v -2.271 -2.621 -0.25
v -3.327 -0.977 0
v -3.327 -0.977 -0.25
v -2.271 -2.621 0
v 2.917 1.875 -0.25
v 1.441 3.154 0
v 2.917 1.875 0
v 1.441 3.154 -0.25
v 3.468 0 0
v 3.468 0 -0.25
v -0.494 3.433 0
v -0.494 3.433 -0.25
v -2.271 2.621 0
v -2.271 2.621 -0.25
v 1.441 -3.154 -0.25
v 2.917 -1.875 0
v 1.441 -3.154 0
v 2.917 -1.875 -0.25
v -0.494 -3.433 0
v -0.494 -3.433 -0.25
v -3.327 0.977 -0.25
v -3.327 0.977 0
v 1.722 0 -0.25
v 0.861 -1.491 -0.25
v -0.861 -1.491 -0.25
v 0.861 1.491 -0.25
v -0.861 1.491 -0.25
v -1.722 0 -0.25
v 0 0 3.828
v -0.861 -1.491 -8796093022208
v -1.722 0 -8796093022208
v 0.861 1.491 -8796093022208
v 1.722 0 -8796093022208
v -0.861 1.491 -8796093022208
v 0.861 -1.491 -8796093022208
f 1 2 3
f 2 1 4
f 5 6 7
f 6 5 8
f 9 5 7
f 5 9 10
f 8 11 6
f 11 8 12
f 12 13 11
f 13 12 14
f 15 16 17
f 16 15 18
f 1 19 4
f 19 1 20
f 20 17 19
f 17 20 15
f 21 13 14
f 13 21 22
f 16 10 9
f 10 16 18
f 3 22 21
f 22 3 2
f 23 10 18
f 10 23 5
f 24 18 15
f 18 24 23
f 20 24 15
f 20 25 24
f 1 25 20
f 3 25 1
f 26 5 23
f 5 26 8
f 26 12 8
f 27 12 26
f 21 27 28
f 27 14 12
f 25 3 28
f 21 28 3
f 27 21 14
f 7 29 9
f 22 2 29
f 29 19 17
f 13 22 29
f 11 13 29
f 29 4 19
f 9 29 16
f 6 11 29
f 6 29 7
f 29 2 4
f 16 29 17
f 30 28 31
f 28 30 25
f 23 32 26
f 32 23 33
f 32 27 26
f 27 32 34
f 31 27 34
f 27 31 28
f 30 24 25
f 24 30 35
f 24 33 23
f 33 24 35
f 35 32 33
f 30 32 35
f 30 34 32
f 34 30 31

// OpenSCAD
// file: get_fragments_from_r.scad
GRID_FINE = 0.000001;
M_PI = 3.14159;

/*	Returns the number of subdivision of a whole circle, given radius and
	the three special variables $fn, $fs and $fa
*/
function get_fragments_from_r(r, fn, fs, fa) =
    r < GRID_FINE ? 3
    : fn > 0 ? (fn >= 3 ? floor(fn) : 3)
    : ceil(max(min(360.0 / fa, r*2*M_PI / fs), 5));
// file: cylinder_mid.scad
use <get_fragments_from_r.scad>

color("yellow") cylinder_mid(1, 1);
color("blue", 0.5) cylinder(1.01, 1, 1, $fn=50);

module cylinder_mid(height, radius)
{
   fn = get_fragments_from_r(radius, $fn, $fs, $fa);
   fudge = (1+1/cos(180/fn))/2;
   cylinder(h=height,r=radius*fudge,$fn=fn);
}
// file: cylinder_outer.scad
use <get_fragments_from_r.scad>

color("yellow") cylinder_outer(1, 1, 1);
color("blue", 0.5) cylinder(1.01, 1, 1, $fn=50);

module cylinder_outer(height, radius1, radius2)
{
    fn = get_fragments_from_r(max(radius1, radius2), $fn, $fs, $fa);
    fudge = 1/cos(180/fn);
    cylinder(height,radius1*fudge,radius2*fudge,$fn=fn);
}
// main file
include <MCAD/units.scad>
use <cylinder_outer.scad>
use <cylinder_mid.scad>

// Thread Rolling Screw
// 
// Flat Head Thread-Forming Screws for Plastic
// Zinc-Plated Steel, Number 8 Size, 1/2" Long
// https://www.mcmaster.com/#95893a325/=1571xmr
//
// T15 Drive
countersink_angle = 82; // degrees

thread_rolling_screw_flathead_predrill("#6");

function flathead_diameter(size) =
    size == "#0" ? 0.112*inch :
    size == "#2" ? 0.162*inch :
    size == "#4" ? 0.212*inch :
    size == "#6" ? 0.262*inch :
    size == "#8" ? 0.312*inch :
    size == "#10"? 0.362*inch :
    0;

function thread_rolling_drill_diameter(size) =
    size == "#0" ? 0.0465*inch :
    size == "#2" ? 0.076*inch :
    size == "#4" ? 0.086*inch :
    size == "#6" ? 0.116*inch :
    size == "#8" ? 0.136*inch :
    size == "#10"? 0.159*inch :
    0;

function thread_rolling_clearance_diameter(size) =
    size == "#0" ? 0.067*inch :
    size == "#2" ? 0.092*inch :
    size == "#4" ? 0.127*inch :
    size == "#6" ? 0.147*inch :
    size == "#8" ? 0.185*inch :
    size == "#10"? 0.212*inch :
    0;

// Practically infinite... OpenSCAD cannot actually use an infinite length.
long = 1e35;

//          predrill_diameter
//               <----->
//               |     |                                     ___
//               |     |                                      ^
//               |     |                                      |
//              /       \     ^                               | length
//             /         \    | head_height                   v
//     Z=0 ___|___________| __v__                            ---
//            |           |       head_margin
module thread_rolling_screw_flathead_predrill(size="#8", length=long, head_margin=0.25*mm, predrill_margin=0.25*mm)
{
    head_diameter = flathead_diameter(size);
    predrill_diameter = thread_rolling_drill_diameter(size) + predrill_margin;

    // head margin
    translate([0,0,-head_margin]) cylinder_outer(head_margin, head_diameter/2, head_diameter/2);
    
    // head
    cylinder_outer(head_diameter/2/tan(countersink_angle/2), head_diameter/2, 0);
    
    // predrill
    cylinder_mid(length, predrill_diameter/2);
}
